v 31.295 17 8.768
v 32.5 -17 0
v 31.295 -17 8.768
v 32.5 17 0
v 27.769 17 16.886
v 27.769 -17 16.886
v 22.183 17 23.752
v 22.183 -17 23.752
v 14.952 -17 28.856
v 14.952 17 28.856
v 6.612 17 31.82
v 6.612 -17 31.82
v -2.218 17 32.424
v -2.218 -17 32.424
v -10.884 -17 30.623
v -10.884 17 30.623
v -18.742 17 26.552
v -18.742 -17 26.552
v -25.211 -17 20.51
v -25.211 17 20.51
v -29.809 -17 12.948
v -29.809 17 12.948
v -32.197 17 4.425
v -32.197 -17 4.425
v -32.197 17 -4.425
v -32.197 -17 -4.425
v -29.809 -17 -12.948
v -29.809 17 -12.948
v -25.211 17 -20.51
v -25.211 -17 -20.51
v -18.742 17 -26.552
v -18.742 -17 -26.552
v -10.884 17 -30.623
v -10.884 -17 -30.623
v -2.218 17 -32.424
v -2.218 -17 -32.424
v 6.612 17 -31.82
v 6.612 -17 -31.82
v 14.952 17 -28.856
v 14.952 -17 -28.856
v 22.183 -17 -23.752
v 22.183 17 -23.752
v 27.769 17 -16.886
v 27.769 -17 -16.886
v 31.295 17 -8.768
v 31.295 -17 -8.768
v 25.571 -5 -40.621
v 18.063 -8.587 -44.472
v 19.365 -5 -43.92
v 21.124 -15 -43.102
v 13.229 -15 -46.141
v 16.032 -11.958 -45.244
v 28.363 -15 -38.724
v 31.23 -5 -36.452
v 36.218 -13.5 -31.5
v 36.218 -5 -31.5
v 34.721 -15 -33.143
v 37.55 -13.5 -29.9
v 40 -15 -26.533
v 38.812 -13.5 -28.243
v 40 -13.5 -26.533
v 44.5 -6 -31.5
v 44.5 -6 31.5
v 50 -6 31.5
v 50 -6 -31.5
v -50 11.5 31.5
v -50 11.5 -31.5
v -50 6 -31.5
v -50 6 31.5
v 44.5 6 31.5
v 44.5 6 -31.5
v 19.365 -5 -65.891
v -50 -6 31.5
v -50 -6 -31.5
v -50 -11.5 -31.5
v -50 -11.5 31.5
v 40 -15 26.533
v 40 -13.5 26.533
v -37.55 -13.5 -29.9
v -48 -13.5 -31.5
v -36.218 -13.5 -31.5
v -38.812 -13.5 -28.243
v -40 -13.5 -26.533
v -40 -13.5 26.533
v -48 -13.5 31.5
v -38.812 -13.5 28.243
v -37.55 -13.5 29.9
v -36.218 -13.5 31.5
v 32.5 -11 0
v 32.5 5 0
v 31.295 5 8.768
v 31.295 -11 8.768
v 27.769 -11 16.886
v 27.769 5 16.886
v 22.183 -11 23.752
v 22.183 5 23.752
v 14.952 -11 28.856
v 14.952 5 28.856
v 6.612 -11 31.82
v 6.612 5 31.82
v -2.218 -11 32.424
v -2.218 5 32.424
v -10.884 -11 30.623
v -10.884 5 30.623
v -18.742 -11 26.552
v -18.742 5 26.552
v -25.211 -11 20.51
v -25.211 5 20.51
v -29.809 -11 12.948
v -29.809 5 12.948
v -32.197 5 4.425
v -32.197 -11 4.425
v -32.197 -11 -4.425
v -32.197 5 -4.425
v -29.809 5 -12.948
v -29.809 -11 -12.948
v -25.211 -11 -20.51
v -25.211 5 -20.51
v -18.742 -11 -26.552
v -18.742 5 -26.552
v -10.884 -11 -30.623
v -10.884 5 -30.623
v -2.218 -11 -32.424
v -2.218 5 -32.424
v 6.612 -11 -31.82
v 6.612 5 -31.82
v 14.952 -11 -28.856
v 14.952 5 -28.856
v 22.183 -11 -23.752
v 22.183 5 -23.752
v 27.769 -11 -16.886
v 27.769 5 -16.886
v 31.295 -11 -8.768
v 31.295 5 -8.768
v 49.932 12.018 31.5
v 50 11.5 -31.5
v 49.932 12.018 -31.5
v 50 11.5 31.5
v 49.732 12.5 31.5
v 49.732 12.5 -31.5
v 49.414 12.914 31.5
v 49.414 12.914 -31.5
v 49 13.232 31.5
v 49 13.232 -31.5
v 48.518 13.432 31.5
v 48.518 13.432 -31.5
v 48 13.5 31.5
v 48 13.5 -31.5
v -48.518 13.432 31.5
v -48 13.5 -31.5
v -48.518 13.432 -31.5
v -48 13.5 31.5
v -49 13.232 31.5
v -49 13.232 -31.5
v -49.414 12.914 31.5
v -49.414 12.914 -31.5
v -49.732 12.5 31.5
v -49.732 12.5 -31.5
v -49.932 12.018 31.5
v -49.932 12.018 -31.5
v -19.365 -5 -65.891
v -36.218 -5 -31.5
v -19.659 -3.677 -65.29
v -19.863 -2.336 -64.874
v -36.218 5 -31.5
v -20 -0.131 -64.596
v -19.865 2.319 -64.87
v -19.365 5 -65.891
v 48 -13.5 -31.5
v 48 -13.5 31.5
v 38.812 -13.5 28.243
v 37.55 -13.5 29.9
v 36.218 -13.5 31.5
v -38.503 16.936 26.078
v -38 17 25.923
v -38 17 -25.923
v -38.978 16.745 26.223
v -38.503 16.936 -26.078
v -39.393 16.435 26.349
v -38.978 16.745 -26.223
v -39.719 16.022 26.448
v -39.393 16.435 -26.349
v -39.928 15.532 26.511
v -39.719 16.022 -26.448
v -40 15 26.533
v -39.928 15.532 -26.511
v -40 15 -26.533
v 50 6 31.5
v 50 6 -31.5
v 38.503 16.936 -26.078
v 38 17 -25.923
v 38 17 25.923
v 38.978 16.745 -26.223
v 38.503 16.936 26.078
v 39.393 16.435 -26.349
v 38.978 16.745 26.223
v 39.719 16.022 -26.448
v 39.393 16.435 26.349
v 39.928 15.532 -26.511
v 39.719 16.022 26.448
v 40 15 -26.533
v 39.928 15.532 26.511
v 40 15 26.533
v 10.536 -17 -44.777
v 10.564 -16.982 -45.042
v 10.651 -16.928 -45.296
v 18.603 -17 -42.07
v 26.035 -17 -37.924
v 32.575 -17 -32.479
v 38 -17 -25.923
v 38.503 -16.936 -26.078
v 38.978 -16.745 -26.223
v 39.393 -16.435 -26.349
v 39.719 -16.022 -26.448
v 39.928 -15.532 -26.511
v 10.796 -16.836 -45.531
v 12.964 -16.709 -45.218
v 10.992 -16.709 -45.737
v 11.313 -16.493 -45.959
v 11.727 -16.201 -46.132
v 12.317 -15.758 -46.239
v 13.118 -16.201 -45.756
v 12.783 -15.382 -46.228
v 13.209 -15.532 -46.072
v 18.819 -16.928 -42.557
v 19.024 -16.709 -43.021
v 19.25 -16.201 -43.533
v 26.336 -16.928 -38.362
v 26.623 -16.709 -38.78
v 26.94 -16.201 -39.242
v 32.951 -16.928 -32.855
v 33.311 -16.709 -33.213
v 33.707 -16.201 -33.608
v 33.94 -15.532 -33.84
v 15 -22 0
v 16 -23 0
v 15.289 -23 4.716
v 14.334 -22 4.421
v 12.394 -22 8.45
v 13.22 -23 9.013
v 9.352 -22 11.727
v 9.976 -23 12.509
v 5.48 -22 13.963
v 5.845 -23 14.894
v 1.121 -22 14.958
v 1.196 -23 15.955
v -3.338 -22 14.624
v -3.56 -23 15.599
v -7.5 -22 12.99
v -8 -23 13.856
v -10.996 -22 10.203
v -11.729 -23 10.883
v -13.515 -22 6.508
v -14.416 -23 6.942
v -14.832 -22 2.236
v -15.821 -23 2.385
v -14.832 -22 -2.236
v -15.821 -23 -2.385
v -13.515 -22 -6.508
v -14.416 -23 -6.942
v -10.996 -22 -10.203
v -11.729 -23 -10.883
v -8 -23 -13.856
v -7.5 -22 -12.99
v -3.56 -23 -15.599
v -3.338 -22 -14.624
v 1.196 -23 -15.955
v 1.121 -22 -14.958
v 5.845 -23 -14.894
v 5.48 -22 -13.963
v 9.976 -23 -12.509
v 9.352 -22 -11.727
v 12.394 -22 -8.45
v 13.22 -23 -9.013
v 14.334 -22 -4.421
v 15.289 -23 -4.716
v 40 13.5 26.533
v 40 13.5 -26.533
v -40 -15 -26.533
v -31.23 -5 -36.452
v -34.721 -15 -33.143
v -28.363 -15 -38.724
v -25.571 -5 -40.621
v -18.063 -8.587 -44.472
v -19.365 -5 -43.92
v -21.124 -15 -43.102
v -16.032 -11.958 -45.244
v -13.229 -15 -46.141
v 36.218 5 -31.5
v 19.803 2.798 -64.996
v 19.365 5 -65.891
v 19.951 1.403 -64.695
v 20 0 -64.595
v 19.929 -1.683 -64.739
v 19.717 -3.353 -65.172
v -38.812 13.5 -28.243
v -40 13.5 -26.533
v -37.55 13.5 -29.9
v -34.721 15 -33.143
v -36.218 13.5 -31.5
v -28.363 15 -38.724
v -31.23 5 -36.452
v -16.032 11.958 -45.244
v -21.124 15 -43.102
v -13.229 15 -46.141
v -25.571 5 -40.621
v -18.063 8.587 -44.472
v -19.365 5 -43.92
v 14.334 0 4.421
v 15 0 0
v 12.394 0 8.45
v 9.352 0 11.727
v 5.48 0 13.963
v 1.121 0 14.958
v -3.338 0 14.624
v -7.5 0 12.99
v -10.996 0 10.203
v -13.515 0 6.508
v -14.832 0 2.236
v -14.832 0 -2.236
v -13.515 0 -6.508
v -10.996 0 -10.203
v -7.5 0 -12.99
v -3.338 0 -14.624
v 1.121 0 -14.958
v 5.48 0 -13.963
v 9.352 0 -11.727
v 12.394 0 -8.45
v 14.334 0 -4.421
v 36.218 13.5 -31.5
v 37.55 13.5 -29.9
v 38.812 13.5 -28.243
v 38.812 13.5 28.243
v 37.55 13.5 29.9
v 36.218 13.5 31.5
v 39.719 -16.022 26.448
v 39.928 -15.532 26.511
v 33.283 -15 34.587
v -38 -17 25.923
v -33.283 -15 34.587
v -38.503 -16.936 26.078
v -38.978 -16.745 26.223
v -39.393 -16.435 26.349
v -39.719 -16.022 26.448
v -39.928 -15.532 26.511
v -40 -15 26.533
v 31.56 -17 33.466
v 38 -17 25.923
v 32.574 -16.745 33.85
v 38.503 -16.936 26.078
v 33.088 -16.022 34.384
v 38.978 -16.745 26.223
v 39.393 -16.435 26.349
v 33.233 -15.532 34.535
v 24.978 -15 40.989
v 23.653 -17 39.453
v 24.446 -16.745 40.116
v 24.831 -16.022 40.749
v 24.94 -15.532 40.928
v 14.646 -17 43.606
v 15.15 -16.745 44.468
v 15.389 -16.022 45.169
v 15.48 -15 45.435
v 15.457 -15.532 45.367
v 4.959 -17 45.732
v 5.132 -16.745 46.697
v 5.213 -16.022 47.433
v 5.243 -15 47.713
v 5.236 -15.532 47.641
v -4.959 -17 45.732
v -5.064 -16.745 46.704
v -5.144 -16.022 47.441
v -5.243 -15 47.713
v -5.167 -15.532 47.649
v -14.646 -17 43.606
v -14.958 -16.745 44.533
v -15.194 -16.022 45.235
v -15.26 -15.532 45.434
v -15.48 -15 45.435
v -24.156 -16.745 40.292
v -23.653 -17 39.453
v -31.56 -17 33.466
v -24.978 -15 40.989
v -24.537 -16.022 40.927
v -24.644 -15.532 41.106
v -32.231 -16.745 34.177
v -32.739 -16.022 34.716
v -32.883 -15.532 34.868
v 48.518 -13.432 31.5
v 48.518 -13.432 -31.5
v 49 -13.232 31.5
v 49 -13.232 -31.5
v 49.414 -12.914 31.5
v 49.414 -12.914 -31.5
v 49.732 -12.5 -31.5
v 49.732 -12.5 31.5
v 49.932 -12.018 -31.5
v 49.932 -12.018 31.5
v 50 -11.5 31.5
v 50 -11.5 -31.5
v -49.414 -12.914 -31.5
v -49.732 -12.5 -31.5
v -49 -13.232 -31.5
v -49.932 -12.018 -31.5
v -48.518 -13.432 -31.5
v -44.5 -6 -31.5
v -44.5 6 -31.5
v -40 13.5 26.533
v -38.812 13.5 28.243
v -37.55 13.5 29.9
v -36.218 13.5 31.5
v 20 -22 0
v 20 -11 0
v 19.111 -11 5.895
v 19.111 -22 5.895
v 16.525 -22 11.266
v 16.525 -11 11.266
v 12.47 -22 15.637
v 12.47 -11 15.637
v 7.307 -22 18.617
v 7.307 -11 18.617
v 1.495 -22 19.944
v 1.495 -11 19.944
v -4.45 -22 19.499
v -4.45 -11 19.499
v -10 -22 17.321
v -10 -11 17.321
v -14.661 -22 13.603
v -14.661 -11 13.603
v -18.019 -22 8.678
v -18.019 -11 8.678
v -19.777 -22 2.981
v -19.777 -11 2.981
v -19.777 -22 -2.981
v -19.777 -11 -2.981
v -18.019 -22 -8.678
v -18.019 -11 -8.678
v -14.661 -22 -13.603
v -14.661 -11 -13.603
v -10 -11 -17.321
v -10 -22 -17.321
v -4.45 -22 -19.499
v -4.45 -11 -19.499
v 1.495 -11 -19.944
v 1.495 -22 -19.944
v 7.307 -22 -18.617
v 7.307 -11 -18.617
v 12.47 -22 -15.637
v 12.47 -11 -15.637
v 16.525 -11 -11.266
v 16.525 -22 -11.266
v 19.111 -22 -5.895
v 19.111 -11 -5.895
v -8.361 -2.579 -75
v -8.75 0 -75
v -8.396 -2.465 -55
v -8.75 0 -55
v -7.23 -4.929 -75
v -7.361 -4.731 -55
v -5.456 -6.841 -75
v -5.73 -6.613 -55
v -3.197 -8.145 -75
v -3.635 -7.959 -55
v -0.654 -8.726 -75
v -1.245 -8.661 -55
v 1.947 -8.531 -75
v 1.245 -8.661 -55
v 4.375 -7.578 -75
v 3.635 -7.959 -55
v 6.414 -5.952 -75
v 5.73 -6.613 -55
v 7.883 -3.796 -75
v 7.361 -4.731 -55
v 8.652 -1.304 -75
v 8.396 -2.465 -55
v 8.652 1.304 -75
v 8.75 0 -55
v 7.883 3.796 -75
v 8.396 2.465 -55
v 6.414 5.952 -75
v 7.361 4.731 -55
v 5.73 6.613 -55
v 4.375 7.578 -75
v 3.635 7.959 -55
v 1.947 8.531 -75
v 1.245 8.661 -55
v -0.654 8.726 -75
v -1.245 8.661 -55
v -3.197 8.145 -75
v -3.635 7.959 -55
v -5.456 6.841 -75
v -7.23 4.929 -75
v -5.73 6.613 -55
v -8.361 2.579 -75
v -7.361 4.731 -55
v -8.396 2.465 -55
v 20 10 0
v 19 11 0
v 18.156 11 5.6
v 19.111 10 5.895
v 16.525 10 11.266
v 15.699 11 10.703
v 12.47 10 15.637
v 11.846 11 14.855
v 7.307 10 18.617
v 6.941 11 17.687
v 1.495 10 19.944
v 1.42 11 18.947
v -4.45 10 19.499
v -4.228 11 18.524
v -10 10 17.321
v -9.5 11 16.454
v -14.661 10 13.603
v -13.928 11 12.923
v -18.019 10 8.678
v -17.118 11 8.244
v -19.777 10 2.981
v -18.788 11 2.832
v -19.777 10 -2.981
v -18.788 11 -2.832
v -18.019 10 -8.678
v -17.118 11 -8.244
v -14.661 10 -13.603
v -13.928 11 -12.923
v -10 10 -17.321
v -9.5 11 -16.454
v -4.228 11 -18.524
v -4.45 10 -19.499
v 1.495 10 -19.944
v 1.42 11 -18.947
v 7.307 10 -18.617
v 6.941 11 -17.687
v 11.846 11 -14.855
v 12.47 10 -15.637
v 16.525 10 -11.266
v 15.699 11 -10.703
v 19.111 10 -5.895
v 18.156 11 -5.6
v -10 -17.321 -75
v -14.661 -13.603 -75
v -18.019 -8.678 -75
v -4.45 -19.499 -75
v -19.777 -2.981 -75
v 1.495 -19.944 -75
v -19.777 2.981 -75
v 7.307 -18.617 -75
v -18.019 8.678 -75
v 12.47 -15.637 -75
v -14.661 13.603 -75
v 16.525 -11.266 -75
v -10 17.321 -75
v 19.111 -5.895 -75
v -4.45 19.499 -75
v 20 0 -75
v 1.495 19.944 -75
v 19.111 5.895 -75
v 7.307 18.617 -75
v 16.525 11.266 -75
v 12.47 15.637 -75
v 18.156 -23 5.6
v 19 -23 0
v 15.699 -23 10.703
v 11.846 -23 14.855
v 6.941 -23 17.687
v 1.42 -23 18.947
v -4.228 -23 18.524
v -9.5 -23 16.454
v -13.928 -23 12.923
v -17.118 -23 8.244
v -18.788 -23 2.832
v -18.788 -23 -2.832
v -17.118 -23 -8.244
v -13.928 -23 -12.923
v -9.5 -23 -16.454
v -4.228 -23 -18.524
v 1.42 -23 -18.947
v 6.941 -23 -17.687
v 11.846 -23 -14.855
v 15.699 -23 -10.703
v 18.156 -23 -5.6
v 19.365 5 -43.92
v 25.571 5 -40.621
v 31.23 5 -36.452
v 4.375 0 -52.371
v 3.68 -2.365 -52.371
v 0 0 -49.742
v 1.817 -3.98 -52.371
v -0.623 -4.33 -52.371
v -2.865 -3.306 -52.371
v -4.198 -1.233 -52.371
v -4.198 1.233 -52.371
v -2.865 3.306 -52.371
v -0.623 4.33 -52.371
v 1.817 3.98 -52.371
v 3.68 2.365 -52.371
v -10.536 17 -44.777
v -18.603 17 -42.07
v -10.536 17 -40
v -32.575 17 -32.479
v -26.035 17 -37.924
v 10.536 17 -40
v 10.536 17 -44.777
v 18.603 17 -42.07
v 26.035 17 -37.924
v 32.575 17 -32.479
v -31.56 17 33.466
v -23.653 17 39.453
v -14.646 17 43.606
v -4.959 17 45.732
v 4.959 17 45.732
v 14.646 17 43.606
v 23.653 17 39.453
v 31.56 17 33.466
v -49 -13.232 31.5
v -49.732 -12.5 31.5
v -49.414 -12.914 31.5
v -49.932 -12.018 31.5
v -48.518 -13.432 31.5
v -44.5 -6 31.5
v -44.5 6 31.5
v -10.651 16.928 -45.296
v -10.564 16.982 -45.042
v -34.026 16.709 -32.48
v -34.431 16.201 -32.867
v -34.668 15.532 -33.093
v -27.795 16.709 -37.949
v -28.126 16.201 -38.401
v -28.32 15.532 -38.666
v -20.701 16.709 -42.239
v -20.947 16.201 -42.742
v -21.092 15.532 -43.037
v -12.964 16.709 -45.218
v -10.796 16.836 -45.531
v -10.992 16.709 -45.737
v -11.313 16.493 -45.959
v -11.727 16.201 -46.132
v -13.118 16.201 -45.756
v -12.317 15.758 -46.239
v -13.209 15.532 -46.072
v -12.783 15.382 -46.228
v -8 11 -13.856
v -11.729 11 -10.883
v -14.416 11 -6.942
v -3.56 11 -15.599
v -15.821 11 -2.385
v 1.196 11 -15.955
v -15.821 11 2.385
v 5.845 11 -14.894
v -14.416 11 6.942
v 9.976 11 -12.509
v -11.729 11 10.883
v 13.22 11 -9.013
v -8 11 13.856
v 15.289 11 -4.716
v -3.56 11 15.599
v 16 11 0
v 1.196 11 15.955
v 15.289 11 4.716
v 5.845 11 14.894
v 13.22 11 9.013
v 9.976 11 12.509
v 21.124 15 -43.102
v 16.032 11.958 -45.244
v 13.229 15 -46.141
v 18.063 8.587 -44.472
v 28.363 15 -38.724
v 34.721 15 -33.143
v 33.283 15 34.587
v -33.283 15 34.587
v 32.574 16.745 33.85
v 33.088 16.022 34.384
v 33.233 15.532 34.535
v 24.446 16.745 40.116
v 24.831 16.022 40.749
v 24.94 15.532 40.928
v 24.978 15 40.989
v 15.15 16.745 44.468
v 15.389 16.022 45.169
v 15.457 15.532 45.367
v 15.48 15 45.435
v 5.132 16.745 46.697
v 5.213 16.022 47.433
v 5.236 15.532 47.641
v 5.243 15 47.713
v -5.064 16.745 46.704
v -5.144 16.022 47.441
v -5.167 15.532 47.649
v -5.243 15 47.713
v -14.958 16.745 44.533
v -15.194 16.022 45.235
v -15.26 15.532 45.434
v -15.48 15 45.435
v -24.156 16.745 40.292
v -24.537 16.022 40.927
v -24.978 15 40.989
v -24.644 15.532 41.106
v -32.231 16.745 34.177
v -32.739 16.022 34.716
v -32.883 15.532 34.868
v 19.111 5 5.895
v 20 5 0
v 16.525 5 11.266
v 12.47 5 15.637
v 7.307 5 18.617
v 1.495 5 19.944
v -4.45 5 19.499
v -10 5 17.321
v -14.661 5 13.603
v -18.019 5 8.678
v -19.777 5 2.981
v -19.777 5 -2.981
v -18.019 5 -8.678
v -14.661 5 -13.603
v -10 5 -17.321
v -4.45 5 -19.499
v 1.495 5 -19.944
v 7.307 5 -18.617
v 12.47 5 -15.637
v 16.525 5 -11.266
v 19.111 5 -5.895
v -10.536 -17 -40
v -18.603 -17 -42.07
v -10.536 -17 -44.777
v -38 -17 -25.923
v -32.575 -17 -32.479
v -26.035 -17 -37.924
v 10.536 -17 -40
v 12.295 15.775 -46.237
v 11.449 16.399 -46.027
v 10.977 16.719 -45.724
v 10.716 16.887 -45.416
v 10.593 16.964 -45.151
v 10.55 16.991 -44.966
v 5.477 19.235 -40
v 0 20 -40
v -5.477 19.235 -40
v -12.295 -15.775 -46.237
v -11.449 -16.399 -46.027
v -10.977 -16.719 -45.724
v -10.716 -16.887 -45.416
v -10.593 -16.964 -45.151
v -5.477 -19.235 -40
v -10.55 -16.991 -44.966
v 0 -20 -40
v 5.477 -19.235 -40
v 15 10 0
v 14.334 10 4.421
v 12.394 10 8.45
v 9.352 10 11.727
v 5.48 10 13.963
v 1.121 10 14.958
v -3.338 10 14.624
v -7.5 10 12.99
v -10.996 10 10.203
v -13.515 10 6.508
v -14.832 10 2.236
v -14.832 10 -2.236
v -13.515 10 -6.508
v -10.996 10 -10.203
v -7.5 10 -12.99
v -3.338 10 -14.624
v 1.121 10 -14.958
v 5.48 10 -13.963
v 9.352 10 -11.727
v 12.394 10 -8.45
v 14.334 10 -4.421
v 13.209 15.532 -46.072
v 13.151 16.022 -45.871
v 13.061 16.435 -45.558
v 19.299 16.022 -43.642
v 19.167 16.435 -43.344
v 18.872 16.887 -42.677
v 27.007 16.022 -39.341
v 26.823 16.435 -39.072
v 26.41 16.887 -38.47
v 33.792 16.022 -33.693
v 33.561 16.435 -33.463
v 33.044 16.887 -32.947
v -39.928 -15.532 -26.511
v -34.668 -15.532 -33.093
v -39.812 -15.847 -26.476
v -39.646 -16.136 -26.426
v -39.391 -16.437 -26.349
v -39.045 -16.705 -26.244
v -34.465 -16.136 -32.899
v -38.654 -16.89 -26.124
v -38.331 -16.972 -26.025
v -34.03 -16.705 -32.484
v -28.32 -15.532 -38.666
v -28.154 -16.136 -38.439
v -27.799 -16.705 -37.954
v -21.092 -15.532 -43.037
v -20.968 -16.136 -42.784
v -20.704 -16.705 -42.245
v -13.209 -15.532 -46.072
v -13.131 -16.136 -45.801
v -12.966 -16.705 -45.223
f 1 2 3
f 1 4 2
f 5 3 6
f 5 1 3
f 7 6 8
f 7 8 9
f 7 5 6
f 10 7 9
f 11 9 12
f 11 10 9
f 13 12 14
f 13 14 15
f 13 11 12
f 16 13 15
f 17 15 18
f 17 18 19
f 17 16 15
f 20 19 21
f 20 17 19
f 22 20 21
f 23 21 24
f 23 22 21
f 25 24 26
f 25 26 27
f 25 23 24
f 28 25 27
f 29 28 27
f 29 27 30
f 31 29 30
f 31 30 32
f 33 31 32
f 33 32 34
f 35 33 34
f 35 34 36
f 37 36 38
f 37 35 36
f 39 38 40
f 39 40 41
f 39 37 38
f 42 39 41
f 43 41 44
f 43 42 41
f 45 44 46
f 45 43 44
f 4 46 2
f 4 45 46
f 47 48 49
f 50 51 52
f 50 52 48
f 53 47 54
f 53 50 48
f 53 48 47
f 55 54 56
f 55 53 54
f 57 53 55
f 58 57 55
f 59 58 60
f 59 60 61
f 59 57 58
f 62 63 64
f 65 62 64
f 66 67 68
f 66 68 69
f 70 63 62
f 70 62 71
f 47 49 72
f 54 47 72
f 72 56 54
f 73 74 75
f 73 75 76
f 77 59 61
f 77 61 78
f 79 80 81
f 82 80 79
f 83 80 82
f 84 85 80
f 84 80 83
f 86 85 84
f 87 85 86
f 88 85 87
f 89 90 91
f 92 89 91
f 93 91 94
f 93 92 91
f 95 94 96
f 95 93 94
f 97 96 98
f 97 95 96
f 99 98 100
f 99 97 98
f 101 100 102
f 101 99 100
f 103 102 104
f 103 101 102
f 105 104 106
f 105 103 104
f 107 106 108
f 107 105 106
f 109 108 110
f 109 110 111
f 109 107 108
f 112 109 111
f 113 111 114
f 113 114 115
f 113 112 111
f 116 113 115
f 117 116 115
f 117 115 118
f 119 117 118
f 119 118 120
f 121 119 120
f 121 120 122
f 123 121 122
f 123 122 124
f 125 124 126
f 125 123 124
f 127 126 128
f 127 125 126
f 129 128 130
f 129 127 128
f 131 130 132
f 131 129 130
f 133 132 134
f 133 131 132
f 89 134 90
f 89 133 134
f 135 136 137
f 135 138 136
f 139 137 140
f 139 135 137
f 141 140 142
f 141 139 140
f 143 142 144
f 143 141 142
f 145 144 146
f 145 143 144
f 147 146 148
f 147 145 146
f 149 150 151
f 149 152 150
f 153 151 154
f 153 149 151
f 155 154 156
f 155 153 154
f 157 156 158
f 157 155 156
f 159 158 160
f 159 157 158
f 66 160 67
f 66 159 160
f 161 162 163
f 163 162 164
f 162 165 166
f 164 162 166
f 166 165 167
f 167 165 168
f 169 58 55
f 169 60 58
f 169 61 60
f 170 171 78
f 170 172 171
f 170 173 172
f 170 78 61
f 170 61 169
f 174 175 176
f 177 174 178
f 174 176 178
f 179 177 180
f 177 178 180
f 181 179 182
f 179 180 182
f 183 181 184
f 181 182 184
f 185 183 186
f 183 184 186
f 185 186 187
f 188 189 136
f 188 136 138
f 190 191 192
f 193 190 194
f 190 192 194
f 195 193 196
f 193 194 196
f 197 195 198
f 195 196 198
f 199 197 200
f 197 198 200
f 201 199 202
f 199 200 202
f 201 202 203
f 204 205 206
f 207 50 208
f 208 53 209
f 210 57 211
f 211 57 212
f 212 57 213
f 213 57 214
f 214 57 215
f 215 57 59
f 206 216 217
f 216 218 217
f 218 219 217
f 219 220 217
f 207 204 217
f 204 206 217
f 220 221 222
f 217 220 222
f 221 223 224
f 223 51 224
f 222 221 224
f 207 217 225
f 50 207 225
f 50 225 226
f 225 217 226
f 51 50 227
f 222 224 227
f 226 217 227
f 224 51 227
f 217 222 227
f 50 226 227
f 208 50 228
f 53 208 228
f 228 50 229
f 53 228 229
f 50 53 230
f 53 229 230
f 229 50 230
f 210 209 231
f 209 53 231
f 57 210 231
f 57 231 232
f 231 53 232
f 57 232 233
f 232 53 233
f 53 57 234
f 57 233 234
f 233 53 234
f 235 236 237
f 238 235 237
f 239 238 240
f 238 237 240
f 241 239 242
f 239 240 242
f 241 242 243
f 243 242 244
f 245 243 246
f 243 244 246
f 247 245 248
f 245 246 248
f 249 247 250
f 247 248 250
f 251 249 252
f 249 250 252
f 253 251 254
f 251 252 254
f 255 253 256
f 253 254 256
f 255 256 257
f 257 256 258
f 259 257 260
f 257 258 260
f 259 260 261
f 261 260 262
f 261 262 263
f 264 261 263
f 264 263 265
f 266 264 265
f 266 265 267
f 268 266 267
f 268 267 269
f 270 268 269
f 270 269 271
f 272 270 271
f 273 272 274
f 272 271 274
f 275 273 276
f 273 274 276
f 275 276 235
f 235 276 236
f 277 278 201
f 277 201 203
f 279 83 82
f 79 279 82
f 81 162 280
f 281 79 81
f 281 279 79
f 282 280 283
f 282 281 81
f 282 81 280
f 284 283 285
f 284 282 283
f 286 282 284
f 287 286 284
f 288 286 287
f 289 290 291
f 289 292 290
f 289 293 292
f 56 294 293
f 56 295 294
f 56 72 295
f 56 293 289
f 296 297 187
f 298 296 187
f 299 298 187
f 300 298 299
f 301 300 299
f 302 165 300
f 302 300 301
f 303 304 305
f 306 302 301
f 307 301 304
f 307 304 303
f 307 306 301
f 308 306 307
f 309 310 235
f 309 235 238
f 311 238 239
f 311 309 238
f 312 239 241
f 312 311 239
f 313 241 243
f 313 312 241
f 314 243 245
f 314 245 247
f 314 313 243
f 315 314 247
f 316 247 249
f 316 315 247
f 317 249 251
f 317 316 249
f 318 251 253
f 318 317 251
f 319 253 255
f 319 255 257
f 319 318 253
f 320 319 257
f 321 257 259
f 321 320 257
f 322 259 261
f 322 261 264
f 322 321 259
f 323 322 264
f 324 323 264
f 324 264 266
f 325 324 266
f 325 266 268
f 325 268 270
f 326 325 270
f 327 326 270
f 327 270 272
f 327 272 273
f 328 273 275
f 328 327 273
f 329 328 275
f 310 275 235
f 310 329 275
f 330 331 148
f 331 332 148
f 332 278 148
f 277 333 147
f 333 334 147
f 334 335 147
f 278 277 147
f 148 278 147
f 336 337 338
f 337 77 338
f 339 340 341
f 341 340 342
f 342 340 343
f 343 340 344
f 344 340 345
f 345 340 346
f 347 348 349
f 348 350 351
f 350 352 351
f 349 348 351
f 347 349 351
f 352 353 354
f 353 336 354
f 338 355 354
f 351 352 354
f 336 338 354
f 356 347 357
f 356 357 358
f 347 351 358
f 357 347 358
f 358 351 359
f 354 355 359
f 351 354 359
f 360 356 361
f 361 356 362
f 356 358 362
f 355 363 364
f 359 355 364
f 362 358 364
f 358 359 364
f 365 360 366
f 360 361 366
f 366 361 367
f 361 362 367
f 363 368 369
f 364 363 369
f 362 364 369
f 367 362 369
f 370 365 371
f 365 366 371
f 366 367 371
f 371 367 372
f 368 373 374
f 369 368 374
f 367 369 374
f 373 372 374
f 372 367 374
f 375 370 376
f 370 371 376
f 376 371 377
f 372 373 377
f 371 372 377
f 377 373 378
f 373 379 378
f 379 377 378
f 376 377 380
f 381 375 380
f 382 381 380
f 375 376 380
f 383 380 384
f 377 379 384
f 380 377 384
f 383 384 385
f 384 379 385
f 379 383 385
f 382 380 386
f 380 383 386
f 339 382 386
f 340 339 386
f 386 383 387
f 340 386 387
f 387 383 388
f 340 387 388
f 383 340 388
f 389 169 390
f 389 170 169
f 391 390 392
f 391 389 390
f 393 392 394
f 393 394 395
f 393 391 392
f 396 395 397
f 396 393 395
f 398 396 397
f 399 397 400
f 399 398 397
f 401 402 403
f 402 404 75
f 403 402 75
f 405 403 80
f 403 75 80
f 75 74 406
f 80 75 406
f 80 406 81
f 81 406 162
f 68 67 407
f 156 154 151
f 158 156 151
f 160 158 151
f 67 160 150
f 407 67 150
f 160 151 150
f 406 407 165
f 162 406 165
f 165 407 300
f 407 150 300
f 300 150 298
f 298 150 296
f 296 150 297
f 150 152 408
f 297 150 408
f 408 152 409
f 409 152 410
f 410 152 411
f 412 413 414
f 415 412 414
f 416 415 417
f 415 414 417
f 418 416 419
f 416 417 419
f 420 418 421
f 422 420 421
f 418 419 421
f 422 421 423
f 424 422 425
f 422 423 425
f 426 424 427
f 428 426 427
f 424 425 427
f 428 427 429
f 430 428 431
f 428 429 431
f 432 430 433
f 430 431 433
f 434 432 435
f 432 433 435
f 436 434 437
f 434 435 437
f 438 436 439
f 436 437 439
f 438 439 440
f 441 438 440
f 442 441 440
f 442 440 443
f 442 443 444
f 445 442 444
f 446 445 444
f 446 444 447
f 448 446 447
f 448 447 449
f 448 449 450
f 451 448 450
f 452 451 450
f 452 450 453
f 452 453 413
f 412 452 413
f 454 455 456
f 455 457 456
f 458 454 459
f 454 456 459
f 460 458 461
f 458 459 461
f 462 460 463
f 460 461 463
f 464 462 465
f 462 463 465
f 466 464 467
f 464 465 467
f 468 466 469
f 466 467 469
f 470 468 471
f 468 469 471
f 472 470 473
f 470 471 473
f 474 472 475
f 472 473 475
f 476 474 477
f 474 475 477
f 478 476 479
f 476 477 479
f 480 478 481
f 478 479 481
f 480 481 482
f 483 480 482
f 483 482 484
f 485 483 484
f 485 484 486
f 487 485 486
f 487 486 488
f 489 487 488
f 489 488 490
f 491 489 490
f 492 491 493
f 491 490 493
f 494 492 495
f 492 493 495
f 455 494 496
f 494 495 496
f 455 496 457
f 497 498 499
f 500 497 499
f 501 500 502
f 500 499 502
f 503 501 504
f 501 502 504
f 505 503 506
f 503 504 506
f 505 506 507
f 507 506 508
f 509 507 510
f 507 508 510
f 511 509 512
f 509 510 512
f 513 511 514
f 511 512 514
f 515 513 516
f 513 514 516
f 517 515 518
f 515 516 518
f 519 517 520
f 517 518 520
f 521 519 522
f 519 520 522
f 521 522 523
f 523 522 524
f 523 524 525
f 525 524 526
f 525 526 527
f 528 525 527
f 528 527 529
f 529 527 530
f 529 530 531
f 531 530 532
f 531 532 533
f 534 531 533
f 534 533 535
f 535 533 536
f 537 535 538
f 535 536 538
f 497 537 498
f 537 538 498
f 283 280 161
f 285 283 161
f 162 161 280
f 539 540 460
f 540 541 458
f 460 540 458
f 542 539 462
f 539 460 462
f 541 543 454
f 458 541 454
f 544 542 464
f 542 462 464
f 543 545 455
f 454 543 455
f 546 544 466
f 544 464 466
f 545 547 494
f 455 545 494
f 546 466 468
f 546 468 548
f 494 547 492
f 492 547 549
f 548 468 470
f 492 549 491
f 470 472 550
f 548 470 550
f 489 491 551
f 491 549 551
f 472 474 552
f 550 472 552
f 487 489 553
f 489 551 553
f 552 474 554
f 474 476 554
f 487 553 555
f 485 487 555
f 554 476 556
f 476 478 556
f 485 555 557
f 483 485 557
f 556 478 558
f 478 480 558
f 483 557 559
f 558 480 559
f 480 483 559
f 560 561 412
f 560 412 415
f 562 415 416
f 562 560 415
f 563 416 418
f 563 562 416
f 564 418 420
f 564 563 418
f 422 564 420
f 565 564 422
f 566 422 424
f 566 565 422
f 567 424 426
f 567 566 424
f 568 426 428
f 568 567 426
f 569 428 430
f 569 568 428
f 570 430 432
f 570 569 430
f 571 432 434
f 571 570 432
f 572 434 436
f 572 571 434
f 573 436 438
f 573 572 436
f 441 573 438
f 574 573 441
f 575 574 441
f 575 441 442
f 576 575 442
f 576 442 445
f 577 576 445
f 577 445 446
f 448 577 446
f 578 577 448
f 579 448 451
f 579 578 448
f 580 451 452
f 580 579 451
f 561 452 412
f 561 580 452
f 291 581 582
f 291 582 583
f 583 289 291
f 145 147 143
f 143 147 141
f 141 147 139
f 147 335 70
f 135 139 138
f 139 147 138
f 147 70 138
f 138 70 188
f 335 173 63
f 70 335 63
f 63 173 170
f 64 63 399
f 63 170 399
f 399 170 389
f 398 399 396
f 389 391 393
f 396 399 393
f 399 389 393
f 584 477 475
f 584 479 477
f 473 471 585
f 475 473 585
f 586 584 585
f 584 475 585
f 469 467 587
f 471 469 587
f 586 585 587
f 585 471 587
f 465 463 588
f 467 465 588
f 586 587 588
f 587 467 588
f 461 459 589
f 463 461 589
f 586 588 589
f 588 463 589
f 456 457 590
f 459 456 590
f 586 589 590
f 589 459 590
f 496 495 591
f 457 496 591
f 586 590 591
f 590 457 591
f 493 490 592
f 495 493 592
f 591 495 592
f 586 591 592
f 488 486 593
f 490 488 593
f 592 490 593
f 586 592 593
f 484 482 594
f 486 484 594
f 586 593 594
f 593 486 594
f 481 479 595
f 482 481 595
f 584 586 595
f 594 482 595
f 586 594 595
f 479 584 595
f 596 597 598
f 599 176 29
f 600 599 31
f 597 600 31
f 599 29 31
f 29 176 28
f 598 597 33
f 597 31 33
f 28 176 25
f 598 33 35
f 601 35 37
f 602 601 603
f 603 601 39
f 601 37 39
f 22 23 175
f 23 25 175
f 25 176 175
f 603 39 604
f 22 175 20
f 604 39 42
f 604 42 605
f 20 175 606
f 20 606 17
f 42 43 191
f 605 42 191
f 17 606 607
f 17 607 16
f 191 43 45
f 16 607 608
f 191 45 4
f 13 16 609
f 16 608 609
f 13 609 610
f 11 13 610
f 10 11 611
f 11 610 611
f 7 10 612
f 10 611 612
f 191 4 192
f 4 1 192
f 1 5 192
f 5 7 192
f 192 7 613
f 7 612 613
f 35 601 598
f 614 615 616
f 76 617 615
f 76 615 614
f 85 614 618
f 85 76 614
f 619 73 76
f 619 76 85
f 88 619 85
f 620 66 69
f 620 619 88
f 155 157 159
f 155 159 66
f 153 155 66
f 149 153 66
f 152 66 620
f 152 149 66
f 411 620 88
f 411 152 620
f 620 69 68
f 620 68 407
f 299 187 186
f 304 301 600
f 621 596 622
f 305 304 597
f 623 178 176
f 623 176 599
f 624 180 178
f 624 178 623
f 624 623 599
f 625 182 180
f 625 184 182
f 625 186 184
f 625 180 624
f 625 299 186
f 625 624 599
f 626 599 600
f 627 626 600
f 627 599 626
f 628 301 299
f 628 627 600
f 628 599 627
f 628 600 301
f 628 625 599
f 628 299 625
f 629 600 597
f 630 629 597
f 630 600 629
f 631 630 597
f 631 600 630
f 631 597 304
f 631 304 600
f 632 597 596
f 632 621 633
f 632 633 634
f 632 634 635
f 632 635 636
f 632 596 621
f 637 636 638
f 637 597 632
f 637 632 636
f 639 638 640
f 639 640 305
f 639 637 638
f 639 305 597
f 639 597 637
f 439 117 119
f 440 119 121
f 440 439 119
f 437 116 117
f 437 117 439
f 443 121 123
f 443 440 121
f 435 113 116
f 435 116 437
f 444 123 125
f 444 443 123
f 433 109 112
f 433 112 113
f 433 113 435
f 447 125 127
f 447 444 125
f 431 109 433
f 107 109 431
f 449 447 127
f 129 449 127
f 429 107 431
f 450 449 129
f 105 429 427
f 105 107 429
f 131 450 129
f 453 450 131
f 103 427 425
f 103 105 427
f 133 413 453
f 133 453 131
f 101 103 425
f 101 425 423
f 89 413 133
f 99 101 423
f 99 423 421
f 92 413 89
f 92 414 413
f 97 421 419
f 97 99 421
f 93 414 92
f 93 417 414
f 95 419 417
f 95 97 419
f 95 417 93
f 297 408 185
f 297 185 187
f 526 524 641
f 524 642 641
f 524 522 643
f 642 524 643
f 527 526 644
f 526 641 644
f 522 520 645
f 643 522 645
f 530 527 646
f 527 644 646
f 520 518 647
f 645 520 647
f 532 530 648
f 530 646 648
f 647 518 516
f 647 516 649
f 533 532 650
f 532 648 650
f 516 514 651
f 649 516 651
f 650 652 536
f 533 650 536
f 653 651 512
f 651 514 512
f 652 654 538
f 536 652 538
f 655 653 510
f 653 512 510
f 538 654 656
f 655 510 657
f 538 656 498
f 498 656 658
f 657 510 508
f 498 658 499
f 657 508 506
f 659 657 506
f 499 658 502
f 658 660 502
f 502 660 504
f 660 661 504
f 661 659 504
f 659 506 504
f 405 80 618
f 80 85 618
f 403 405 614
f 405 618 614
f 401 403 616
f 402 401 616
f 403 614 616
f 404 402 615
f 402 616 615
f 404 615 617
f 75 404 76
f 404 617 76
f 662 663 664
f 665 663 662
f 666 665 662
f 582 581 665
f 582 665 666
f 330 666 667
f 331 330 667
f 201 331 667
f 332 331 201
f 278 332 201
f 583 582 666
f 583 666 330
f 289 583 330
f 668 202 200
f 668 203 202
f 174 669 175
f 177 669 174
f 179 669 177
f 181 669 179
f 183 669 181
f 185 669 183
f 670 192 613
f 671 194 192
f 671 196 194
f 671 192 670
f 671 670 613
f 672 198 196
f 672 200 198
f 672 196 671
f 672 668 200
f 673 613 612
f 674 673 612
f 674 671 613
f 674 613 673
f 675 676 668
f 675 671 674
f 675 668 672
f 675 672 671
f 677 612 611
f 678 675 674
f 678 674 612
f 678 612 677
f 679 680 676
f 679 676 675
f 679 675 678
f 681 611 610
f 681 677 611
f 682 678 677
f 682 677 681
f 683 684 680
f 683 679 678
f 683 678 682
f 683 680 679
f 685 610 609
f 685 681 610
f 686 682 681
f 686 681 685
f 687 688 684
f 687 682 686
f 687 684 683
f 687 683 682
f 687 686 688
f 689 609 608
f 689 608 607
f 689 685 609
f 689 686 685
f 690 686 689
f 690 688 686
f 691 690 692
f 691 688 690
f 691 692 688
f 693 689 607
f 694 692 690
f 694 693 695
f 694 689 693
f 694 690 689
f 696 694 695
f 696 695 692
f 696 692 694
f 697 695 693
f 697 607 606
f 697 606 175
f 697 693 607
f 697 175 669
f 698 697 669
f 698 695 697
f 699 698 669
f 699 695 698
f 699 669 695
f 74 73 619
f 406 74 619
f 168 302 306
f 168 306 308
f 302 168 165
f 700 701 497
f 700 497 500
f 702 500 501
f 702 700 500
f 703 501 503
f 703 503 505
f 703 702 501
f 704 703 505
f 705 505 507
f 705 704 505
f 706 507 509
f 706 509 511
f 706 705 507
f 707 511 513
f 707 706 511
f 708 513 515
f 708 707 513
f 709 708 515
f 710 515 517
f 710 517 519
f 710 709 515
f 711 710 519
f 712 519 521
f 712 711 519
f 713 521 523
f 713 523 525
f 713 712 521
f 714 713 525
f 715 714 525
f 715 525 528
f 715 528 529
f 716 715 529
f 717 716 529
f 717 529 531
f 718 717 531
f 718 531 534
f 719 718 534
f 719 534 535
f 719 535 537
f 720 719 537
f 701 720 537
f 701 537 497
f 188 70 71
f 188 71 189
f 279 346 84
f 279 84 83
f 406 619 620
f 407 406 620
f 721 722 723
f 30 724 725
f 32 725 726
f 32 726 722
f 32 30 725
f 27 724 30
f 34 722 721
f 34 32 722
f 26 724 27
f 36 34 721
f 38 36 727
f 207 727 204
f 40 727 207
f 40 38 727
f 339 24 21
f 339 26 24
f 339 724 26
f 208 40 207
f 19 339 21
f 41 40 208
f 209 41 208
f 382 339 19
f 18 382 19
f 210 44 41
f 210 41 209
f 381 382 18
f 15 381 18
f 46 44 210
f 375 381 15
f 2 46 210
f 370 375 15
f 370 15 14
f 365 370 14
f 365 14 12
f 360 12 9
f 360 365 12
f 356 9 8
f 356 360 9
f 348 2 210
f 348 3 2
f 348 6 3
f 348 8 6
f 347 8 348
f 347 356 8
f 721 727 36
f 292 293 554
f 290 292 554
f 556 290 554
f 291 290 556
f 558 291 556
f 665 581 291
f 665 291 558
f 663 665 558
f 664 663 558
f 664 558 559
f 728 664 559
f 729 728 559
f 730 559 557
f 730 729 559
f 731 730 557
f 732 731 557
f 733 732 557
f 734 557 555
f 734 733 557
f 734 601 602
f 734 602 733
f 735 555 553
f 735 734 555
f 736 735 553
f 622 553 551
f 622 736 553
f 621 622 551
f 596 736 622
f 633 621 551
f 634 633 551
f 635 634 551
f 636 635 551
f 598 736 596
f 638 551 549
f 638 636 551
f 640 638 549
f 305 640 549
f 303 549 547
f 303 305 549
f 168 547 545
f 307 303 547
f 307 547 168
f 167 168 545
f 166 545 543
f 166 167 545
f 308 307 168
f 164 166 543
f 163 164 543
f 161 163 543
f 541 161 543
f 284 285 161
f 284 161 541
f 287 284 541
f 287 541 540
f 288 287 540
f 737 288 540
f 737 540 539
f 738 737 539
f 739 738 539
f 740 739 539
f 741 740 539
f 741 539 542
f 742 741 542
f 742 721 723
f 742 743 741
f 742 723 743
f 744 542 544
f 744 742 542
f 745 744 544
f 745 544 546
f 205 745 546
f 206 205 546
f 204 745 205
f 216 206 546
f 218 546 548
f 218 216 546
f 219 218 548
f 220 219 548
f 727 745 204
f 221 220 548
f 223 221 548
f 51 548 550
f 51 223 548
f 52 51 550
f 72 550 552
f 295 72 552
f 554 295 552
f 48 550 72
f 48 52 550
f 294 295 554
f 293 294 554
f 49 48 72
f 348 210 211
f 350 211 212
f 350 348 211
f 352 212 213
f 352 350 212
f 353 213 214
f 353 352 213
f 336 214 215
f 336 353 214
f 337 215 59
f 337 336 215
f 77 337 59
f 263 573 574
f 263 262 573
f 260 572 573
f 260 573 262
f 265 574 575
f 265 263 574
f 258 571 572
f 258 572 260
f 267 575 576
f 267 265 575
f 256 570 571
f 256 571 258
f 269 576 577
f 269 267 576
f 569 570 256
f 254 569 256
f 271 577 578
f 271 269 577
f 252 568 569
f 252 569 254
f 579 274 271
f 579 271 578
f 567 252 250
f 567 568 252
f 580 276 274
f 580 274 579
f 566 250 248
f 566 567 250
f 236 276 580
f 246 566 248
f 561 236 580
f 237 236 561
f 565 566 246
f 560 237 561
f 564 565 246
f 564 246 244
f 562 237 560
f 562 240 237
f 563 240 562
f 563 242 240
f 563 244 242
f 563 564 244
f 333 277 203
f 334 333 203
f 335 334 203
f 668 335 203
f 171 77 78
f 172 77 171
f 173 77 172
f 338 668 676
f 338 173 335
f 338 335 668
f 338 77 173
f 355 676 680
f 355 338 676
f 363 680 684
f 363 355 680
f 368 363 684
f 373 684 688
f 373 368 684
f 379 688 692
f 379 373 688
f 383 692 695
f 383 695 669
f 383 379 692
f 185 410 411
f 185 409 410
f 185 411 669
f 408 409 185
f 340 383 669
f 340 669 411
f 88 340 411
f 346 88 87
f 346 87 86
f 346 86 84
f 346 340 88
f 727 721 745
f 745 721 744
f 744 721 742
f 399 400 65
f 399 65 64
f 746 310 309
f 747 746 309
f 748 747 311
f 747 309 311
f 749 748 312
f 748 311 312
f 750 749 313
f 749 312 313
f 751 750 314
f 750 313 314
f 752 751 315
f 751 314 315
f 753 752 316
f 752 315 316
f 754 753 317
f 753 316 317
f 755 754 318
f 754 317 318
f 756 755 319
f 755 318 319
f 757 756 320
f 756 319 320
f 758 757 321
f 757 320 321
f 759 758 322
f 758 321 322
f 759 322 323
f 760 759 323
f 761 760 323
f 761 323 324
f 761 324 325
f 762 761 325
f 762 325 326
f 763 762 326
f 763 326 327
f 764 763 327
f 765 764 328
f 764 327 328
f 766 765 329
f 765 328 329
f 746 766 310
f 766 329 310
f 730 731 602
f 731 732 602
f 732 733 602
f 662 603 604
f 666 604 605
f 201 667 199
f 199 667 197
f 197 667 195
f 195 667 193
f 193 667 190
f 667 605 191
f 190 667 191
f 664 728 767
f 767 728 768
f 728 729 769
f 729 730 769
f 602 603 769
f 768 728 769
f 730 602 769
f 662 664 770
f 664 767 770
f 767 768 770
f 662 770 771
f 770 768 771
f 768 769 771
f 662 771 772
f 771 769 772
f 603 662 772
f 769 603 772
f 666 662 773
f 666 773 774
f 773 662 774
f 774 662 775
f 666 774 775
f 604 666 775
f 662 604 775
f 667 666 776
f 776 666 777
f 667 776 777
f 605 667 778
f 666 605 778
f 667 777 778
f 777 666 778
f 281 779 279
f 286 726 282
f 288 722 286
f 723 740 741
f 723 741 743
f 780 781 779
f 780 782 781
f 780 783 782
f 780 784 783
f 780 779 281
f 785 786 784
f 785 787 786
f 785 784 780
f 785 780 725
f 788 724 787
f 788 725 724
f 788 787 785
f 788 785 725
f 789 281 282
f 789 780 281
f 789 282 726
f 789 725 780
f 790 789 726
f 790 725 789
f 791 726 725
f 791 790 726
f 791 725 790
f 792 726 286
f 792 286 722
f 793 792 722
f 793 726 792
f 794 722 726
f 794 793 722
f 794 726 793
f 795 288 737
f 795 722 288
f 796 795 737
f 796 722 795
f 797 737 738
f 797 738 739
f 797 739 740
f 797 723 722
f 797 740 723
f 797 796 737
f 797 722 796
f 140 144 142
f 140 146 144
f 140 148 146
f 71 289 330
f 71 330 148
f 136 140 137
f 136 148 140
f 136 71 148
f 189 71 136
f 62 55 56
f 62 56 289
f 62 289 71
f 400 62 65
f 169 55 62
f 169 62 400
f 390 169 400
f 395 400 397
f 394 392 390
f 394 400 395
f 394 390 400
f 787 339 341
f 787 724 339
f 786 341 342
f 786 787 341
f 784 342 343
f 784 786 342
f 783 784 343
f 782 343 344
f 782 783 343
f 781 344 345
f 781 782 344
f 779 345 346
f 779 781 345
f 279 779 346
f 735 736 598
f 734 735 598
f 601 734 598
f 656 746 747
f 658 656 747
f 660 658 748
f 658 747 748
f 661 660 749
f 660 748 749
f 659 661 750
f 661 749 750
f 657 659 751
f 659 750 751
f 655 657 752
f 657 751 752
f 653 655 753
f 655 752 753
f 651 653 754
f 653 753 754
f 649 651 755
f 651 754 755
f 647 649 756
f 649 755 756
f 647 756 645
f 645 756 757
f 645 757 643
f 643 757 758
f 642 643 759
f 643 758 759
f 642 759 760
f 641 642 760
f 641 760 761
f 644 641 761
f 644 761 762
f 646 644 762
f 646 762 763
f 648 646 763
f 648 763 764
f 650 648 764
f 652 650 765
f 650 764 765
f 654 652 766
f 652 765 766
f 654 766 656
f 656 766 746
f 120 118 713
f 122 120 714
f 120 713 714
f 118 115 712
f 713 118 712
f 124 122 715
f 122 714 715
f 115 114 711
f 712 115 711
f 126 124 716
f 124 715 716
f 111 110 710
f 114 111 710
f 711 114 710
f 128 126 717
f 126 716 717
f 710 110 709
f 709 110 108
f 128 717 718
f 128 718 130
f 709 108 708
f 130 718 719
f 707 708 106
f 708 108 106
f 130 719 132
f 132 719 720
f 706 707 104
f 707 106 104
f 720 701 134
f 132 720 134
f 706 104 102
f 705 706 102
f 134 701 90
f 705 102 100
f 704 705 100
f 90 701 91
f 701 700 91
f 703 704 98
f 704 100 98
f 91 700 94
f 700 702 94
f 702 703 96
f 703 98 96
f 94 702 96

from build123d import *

# Parameters (mm, degrees)
F0_R           = 32.5
F1_DEPTH       = 17
F2_W           = 13.7819105971
F2_H           = 63
F3_DEPTH       = 13.5
F4_W           = 11
F4_H           = 12
F5_DEPTH       = 79.501
F7_R           = 20
F8_DEPTH       = 35
F10_D          = 17.5
F10_DEPTH      = 20
F10_TIP        = 5.2575304165
F12_DEPTH      = 5
F13_R          = 32.5
F13_R_2        = 20
F14_DEPTH      = 11
F14_DEPTH_BACK = 5
F15_R          = 20
F15_R_2        = 15
F16_DEPTH      = 23
F16_DEPTH_BACK = 11
F17_SIZE       = 1
F18_R          = 2


with BuildPart() as f1:
    # F0 (on Front) → F1 (new body, symmetric)
    with BuildSketch(Plane.XZ):
        with BuildLine():
            Line((-40, 26.5329983228), (-40, -26.5329983228))
            ThreePointArc((-40, -26.5329983228), (0, -48), (40, -26.5329983228))
            Line((40, -26.5329983228), (40, 26.5329983228))
            ThreePointArc((40, 26.5329983228), (0, 48), (-40, 26.5329983228))
        make_face()
        Circle(F0_R, mode=Mode.SUBTRACT)
    extrude(amount=F1_DEPTH, both=True)

    # F2 (on Front) → F3 (join, symmetric)
    with BuildSketch(Plane.XZ):
        with Locations((-43.1090447015, 0)):
            Rectangle(F2_W, F2_H)
        with Locations((43.1090447015, 0)):
            Rectangle(F2_W, F2_H)
    extrude(amount=F3_DEPTH, both=True)

    # F4 (on face) → F5 (cut, through all)
    with BuildSketch(Plane.XY.offset(31.5)):
        with Locations((50, 0)):
            Rectangle(F4_W, F4_H)
        with Locations((-50, 0)):
            Rectangle(F4_W, F4_H)
    extrude(amount=-F5_DEPTH, mode=Mode.SUBTRACT)

    # F7 (on offset) → F8 (join)
    with BuildSketch(Plane.XY.offset(-40)):
        Circle(F7_R)
    extrude(amount=-F8_DEPTH)

    # F10
    with Locations(Plane(origin=(0, 0, -75), x_dir=(1, 0, 0), z_dir=(0, 0, -1))):
        with Locations((0, 0)):
            Hole(F10_D / 2, depth=F10_DEPTH)
            with Locations((0, 0, -(F10_DEPTH + F10_TIP / 2))):  # 118° drill point
                Cone(0, F10_D / 2, F10_TIP, mode=Mode.SUBTRACT)

    # F11 (on Front) → F12 (join, symmetric)
    with BuildSketch(Plane.XZ):
        Polygon((-17.5, -44.6961967062), (-36.2180894029, -31.5), (-17.5, -69.6961967062), align=None)
        Polygon((36.2180894029, -31.5), (17.5, -44.6961967062), (17.5, -69.6961967062), align=None)
    extrude(amount=F12_DEPTH, both=True)

    # F18
    f18_edges = [f1.edges().sort_by_distance(p)[0] for p in [
        (0, -17, 48),
        (-27.229577, -17, -39.529105),
        (27.229577, -17, -39.529105),
        (-40, -17, 0),
        (40, -17, 0),
        (0, 17, 48),
        (40, 17, 0),
        (27.229577, 17, -39.529105),
        (-27.229577, 17, -39.529105),
        (-40, 17, 0),
        (50, -13.5, 0),
        (50, 13.5, 0),
        (-50, -13.5, 0),
        (-50, 13.5, 0),
    ]]
    fillet(f18_edges, radius=F18_R)


with BuildPart() as f14:
    # F13 (on Front) → F14 (new body, two sides)
    with BuildSketch(Plane.XZ) as f14_sk:
        Circle(F13_R)
        Circle(F13_R_2, mode=Mode.SUBTRACT)
    extrude(amount=F14_DEPTH)
    extrude(f14_sk.sketch, amount=-F14_DEPTH_BACK)

    # F15 (on Front) → F16 (join, two sides)
    with BuildSketch(Plane.XZ) as f16_sk:
        Circle(F15_R)
        Circle(F15_R_2, mode=Mode.SUBTRACT)
    extrude(amount=F16_DEPTH)
    extrude(f16_sk.sketch, amount=-F16_DEPTH_BACK)

    # F17
    f17_edges = [f14.edges().sort_by_distance(p)[0] for p in [
        (-20, -23, 0),
        (-15, -23, 0),
        (-20, 11, 0),
        (-15, 11, 0),
    ]]
    chamfer(f17_edges, length=F17_SIZE)


solid = Compound([f1.part, f14.part])
